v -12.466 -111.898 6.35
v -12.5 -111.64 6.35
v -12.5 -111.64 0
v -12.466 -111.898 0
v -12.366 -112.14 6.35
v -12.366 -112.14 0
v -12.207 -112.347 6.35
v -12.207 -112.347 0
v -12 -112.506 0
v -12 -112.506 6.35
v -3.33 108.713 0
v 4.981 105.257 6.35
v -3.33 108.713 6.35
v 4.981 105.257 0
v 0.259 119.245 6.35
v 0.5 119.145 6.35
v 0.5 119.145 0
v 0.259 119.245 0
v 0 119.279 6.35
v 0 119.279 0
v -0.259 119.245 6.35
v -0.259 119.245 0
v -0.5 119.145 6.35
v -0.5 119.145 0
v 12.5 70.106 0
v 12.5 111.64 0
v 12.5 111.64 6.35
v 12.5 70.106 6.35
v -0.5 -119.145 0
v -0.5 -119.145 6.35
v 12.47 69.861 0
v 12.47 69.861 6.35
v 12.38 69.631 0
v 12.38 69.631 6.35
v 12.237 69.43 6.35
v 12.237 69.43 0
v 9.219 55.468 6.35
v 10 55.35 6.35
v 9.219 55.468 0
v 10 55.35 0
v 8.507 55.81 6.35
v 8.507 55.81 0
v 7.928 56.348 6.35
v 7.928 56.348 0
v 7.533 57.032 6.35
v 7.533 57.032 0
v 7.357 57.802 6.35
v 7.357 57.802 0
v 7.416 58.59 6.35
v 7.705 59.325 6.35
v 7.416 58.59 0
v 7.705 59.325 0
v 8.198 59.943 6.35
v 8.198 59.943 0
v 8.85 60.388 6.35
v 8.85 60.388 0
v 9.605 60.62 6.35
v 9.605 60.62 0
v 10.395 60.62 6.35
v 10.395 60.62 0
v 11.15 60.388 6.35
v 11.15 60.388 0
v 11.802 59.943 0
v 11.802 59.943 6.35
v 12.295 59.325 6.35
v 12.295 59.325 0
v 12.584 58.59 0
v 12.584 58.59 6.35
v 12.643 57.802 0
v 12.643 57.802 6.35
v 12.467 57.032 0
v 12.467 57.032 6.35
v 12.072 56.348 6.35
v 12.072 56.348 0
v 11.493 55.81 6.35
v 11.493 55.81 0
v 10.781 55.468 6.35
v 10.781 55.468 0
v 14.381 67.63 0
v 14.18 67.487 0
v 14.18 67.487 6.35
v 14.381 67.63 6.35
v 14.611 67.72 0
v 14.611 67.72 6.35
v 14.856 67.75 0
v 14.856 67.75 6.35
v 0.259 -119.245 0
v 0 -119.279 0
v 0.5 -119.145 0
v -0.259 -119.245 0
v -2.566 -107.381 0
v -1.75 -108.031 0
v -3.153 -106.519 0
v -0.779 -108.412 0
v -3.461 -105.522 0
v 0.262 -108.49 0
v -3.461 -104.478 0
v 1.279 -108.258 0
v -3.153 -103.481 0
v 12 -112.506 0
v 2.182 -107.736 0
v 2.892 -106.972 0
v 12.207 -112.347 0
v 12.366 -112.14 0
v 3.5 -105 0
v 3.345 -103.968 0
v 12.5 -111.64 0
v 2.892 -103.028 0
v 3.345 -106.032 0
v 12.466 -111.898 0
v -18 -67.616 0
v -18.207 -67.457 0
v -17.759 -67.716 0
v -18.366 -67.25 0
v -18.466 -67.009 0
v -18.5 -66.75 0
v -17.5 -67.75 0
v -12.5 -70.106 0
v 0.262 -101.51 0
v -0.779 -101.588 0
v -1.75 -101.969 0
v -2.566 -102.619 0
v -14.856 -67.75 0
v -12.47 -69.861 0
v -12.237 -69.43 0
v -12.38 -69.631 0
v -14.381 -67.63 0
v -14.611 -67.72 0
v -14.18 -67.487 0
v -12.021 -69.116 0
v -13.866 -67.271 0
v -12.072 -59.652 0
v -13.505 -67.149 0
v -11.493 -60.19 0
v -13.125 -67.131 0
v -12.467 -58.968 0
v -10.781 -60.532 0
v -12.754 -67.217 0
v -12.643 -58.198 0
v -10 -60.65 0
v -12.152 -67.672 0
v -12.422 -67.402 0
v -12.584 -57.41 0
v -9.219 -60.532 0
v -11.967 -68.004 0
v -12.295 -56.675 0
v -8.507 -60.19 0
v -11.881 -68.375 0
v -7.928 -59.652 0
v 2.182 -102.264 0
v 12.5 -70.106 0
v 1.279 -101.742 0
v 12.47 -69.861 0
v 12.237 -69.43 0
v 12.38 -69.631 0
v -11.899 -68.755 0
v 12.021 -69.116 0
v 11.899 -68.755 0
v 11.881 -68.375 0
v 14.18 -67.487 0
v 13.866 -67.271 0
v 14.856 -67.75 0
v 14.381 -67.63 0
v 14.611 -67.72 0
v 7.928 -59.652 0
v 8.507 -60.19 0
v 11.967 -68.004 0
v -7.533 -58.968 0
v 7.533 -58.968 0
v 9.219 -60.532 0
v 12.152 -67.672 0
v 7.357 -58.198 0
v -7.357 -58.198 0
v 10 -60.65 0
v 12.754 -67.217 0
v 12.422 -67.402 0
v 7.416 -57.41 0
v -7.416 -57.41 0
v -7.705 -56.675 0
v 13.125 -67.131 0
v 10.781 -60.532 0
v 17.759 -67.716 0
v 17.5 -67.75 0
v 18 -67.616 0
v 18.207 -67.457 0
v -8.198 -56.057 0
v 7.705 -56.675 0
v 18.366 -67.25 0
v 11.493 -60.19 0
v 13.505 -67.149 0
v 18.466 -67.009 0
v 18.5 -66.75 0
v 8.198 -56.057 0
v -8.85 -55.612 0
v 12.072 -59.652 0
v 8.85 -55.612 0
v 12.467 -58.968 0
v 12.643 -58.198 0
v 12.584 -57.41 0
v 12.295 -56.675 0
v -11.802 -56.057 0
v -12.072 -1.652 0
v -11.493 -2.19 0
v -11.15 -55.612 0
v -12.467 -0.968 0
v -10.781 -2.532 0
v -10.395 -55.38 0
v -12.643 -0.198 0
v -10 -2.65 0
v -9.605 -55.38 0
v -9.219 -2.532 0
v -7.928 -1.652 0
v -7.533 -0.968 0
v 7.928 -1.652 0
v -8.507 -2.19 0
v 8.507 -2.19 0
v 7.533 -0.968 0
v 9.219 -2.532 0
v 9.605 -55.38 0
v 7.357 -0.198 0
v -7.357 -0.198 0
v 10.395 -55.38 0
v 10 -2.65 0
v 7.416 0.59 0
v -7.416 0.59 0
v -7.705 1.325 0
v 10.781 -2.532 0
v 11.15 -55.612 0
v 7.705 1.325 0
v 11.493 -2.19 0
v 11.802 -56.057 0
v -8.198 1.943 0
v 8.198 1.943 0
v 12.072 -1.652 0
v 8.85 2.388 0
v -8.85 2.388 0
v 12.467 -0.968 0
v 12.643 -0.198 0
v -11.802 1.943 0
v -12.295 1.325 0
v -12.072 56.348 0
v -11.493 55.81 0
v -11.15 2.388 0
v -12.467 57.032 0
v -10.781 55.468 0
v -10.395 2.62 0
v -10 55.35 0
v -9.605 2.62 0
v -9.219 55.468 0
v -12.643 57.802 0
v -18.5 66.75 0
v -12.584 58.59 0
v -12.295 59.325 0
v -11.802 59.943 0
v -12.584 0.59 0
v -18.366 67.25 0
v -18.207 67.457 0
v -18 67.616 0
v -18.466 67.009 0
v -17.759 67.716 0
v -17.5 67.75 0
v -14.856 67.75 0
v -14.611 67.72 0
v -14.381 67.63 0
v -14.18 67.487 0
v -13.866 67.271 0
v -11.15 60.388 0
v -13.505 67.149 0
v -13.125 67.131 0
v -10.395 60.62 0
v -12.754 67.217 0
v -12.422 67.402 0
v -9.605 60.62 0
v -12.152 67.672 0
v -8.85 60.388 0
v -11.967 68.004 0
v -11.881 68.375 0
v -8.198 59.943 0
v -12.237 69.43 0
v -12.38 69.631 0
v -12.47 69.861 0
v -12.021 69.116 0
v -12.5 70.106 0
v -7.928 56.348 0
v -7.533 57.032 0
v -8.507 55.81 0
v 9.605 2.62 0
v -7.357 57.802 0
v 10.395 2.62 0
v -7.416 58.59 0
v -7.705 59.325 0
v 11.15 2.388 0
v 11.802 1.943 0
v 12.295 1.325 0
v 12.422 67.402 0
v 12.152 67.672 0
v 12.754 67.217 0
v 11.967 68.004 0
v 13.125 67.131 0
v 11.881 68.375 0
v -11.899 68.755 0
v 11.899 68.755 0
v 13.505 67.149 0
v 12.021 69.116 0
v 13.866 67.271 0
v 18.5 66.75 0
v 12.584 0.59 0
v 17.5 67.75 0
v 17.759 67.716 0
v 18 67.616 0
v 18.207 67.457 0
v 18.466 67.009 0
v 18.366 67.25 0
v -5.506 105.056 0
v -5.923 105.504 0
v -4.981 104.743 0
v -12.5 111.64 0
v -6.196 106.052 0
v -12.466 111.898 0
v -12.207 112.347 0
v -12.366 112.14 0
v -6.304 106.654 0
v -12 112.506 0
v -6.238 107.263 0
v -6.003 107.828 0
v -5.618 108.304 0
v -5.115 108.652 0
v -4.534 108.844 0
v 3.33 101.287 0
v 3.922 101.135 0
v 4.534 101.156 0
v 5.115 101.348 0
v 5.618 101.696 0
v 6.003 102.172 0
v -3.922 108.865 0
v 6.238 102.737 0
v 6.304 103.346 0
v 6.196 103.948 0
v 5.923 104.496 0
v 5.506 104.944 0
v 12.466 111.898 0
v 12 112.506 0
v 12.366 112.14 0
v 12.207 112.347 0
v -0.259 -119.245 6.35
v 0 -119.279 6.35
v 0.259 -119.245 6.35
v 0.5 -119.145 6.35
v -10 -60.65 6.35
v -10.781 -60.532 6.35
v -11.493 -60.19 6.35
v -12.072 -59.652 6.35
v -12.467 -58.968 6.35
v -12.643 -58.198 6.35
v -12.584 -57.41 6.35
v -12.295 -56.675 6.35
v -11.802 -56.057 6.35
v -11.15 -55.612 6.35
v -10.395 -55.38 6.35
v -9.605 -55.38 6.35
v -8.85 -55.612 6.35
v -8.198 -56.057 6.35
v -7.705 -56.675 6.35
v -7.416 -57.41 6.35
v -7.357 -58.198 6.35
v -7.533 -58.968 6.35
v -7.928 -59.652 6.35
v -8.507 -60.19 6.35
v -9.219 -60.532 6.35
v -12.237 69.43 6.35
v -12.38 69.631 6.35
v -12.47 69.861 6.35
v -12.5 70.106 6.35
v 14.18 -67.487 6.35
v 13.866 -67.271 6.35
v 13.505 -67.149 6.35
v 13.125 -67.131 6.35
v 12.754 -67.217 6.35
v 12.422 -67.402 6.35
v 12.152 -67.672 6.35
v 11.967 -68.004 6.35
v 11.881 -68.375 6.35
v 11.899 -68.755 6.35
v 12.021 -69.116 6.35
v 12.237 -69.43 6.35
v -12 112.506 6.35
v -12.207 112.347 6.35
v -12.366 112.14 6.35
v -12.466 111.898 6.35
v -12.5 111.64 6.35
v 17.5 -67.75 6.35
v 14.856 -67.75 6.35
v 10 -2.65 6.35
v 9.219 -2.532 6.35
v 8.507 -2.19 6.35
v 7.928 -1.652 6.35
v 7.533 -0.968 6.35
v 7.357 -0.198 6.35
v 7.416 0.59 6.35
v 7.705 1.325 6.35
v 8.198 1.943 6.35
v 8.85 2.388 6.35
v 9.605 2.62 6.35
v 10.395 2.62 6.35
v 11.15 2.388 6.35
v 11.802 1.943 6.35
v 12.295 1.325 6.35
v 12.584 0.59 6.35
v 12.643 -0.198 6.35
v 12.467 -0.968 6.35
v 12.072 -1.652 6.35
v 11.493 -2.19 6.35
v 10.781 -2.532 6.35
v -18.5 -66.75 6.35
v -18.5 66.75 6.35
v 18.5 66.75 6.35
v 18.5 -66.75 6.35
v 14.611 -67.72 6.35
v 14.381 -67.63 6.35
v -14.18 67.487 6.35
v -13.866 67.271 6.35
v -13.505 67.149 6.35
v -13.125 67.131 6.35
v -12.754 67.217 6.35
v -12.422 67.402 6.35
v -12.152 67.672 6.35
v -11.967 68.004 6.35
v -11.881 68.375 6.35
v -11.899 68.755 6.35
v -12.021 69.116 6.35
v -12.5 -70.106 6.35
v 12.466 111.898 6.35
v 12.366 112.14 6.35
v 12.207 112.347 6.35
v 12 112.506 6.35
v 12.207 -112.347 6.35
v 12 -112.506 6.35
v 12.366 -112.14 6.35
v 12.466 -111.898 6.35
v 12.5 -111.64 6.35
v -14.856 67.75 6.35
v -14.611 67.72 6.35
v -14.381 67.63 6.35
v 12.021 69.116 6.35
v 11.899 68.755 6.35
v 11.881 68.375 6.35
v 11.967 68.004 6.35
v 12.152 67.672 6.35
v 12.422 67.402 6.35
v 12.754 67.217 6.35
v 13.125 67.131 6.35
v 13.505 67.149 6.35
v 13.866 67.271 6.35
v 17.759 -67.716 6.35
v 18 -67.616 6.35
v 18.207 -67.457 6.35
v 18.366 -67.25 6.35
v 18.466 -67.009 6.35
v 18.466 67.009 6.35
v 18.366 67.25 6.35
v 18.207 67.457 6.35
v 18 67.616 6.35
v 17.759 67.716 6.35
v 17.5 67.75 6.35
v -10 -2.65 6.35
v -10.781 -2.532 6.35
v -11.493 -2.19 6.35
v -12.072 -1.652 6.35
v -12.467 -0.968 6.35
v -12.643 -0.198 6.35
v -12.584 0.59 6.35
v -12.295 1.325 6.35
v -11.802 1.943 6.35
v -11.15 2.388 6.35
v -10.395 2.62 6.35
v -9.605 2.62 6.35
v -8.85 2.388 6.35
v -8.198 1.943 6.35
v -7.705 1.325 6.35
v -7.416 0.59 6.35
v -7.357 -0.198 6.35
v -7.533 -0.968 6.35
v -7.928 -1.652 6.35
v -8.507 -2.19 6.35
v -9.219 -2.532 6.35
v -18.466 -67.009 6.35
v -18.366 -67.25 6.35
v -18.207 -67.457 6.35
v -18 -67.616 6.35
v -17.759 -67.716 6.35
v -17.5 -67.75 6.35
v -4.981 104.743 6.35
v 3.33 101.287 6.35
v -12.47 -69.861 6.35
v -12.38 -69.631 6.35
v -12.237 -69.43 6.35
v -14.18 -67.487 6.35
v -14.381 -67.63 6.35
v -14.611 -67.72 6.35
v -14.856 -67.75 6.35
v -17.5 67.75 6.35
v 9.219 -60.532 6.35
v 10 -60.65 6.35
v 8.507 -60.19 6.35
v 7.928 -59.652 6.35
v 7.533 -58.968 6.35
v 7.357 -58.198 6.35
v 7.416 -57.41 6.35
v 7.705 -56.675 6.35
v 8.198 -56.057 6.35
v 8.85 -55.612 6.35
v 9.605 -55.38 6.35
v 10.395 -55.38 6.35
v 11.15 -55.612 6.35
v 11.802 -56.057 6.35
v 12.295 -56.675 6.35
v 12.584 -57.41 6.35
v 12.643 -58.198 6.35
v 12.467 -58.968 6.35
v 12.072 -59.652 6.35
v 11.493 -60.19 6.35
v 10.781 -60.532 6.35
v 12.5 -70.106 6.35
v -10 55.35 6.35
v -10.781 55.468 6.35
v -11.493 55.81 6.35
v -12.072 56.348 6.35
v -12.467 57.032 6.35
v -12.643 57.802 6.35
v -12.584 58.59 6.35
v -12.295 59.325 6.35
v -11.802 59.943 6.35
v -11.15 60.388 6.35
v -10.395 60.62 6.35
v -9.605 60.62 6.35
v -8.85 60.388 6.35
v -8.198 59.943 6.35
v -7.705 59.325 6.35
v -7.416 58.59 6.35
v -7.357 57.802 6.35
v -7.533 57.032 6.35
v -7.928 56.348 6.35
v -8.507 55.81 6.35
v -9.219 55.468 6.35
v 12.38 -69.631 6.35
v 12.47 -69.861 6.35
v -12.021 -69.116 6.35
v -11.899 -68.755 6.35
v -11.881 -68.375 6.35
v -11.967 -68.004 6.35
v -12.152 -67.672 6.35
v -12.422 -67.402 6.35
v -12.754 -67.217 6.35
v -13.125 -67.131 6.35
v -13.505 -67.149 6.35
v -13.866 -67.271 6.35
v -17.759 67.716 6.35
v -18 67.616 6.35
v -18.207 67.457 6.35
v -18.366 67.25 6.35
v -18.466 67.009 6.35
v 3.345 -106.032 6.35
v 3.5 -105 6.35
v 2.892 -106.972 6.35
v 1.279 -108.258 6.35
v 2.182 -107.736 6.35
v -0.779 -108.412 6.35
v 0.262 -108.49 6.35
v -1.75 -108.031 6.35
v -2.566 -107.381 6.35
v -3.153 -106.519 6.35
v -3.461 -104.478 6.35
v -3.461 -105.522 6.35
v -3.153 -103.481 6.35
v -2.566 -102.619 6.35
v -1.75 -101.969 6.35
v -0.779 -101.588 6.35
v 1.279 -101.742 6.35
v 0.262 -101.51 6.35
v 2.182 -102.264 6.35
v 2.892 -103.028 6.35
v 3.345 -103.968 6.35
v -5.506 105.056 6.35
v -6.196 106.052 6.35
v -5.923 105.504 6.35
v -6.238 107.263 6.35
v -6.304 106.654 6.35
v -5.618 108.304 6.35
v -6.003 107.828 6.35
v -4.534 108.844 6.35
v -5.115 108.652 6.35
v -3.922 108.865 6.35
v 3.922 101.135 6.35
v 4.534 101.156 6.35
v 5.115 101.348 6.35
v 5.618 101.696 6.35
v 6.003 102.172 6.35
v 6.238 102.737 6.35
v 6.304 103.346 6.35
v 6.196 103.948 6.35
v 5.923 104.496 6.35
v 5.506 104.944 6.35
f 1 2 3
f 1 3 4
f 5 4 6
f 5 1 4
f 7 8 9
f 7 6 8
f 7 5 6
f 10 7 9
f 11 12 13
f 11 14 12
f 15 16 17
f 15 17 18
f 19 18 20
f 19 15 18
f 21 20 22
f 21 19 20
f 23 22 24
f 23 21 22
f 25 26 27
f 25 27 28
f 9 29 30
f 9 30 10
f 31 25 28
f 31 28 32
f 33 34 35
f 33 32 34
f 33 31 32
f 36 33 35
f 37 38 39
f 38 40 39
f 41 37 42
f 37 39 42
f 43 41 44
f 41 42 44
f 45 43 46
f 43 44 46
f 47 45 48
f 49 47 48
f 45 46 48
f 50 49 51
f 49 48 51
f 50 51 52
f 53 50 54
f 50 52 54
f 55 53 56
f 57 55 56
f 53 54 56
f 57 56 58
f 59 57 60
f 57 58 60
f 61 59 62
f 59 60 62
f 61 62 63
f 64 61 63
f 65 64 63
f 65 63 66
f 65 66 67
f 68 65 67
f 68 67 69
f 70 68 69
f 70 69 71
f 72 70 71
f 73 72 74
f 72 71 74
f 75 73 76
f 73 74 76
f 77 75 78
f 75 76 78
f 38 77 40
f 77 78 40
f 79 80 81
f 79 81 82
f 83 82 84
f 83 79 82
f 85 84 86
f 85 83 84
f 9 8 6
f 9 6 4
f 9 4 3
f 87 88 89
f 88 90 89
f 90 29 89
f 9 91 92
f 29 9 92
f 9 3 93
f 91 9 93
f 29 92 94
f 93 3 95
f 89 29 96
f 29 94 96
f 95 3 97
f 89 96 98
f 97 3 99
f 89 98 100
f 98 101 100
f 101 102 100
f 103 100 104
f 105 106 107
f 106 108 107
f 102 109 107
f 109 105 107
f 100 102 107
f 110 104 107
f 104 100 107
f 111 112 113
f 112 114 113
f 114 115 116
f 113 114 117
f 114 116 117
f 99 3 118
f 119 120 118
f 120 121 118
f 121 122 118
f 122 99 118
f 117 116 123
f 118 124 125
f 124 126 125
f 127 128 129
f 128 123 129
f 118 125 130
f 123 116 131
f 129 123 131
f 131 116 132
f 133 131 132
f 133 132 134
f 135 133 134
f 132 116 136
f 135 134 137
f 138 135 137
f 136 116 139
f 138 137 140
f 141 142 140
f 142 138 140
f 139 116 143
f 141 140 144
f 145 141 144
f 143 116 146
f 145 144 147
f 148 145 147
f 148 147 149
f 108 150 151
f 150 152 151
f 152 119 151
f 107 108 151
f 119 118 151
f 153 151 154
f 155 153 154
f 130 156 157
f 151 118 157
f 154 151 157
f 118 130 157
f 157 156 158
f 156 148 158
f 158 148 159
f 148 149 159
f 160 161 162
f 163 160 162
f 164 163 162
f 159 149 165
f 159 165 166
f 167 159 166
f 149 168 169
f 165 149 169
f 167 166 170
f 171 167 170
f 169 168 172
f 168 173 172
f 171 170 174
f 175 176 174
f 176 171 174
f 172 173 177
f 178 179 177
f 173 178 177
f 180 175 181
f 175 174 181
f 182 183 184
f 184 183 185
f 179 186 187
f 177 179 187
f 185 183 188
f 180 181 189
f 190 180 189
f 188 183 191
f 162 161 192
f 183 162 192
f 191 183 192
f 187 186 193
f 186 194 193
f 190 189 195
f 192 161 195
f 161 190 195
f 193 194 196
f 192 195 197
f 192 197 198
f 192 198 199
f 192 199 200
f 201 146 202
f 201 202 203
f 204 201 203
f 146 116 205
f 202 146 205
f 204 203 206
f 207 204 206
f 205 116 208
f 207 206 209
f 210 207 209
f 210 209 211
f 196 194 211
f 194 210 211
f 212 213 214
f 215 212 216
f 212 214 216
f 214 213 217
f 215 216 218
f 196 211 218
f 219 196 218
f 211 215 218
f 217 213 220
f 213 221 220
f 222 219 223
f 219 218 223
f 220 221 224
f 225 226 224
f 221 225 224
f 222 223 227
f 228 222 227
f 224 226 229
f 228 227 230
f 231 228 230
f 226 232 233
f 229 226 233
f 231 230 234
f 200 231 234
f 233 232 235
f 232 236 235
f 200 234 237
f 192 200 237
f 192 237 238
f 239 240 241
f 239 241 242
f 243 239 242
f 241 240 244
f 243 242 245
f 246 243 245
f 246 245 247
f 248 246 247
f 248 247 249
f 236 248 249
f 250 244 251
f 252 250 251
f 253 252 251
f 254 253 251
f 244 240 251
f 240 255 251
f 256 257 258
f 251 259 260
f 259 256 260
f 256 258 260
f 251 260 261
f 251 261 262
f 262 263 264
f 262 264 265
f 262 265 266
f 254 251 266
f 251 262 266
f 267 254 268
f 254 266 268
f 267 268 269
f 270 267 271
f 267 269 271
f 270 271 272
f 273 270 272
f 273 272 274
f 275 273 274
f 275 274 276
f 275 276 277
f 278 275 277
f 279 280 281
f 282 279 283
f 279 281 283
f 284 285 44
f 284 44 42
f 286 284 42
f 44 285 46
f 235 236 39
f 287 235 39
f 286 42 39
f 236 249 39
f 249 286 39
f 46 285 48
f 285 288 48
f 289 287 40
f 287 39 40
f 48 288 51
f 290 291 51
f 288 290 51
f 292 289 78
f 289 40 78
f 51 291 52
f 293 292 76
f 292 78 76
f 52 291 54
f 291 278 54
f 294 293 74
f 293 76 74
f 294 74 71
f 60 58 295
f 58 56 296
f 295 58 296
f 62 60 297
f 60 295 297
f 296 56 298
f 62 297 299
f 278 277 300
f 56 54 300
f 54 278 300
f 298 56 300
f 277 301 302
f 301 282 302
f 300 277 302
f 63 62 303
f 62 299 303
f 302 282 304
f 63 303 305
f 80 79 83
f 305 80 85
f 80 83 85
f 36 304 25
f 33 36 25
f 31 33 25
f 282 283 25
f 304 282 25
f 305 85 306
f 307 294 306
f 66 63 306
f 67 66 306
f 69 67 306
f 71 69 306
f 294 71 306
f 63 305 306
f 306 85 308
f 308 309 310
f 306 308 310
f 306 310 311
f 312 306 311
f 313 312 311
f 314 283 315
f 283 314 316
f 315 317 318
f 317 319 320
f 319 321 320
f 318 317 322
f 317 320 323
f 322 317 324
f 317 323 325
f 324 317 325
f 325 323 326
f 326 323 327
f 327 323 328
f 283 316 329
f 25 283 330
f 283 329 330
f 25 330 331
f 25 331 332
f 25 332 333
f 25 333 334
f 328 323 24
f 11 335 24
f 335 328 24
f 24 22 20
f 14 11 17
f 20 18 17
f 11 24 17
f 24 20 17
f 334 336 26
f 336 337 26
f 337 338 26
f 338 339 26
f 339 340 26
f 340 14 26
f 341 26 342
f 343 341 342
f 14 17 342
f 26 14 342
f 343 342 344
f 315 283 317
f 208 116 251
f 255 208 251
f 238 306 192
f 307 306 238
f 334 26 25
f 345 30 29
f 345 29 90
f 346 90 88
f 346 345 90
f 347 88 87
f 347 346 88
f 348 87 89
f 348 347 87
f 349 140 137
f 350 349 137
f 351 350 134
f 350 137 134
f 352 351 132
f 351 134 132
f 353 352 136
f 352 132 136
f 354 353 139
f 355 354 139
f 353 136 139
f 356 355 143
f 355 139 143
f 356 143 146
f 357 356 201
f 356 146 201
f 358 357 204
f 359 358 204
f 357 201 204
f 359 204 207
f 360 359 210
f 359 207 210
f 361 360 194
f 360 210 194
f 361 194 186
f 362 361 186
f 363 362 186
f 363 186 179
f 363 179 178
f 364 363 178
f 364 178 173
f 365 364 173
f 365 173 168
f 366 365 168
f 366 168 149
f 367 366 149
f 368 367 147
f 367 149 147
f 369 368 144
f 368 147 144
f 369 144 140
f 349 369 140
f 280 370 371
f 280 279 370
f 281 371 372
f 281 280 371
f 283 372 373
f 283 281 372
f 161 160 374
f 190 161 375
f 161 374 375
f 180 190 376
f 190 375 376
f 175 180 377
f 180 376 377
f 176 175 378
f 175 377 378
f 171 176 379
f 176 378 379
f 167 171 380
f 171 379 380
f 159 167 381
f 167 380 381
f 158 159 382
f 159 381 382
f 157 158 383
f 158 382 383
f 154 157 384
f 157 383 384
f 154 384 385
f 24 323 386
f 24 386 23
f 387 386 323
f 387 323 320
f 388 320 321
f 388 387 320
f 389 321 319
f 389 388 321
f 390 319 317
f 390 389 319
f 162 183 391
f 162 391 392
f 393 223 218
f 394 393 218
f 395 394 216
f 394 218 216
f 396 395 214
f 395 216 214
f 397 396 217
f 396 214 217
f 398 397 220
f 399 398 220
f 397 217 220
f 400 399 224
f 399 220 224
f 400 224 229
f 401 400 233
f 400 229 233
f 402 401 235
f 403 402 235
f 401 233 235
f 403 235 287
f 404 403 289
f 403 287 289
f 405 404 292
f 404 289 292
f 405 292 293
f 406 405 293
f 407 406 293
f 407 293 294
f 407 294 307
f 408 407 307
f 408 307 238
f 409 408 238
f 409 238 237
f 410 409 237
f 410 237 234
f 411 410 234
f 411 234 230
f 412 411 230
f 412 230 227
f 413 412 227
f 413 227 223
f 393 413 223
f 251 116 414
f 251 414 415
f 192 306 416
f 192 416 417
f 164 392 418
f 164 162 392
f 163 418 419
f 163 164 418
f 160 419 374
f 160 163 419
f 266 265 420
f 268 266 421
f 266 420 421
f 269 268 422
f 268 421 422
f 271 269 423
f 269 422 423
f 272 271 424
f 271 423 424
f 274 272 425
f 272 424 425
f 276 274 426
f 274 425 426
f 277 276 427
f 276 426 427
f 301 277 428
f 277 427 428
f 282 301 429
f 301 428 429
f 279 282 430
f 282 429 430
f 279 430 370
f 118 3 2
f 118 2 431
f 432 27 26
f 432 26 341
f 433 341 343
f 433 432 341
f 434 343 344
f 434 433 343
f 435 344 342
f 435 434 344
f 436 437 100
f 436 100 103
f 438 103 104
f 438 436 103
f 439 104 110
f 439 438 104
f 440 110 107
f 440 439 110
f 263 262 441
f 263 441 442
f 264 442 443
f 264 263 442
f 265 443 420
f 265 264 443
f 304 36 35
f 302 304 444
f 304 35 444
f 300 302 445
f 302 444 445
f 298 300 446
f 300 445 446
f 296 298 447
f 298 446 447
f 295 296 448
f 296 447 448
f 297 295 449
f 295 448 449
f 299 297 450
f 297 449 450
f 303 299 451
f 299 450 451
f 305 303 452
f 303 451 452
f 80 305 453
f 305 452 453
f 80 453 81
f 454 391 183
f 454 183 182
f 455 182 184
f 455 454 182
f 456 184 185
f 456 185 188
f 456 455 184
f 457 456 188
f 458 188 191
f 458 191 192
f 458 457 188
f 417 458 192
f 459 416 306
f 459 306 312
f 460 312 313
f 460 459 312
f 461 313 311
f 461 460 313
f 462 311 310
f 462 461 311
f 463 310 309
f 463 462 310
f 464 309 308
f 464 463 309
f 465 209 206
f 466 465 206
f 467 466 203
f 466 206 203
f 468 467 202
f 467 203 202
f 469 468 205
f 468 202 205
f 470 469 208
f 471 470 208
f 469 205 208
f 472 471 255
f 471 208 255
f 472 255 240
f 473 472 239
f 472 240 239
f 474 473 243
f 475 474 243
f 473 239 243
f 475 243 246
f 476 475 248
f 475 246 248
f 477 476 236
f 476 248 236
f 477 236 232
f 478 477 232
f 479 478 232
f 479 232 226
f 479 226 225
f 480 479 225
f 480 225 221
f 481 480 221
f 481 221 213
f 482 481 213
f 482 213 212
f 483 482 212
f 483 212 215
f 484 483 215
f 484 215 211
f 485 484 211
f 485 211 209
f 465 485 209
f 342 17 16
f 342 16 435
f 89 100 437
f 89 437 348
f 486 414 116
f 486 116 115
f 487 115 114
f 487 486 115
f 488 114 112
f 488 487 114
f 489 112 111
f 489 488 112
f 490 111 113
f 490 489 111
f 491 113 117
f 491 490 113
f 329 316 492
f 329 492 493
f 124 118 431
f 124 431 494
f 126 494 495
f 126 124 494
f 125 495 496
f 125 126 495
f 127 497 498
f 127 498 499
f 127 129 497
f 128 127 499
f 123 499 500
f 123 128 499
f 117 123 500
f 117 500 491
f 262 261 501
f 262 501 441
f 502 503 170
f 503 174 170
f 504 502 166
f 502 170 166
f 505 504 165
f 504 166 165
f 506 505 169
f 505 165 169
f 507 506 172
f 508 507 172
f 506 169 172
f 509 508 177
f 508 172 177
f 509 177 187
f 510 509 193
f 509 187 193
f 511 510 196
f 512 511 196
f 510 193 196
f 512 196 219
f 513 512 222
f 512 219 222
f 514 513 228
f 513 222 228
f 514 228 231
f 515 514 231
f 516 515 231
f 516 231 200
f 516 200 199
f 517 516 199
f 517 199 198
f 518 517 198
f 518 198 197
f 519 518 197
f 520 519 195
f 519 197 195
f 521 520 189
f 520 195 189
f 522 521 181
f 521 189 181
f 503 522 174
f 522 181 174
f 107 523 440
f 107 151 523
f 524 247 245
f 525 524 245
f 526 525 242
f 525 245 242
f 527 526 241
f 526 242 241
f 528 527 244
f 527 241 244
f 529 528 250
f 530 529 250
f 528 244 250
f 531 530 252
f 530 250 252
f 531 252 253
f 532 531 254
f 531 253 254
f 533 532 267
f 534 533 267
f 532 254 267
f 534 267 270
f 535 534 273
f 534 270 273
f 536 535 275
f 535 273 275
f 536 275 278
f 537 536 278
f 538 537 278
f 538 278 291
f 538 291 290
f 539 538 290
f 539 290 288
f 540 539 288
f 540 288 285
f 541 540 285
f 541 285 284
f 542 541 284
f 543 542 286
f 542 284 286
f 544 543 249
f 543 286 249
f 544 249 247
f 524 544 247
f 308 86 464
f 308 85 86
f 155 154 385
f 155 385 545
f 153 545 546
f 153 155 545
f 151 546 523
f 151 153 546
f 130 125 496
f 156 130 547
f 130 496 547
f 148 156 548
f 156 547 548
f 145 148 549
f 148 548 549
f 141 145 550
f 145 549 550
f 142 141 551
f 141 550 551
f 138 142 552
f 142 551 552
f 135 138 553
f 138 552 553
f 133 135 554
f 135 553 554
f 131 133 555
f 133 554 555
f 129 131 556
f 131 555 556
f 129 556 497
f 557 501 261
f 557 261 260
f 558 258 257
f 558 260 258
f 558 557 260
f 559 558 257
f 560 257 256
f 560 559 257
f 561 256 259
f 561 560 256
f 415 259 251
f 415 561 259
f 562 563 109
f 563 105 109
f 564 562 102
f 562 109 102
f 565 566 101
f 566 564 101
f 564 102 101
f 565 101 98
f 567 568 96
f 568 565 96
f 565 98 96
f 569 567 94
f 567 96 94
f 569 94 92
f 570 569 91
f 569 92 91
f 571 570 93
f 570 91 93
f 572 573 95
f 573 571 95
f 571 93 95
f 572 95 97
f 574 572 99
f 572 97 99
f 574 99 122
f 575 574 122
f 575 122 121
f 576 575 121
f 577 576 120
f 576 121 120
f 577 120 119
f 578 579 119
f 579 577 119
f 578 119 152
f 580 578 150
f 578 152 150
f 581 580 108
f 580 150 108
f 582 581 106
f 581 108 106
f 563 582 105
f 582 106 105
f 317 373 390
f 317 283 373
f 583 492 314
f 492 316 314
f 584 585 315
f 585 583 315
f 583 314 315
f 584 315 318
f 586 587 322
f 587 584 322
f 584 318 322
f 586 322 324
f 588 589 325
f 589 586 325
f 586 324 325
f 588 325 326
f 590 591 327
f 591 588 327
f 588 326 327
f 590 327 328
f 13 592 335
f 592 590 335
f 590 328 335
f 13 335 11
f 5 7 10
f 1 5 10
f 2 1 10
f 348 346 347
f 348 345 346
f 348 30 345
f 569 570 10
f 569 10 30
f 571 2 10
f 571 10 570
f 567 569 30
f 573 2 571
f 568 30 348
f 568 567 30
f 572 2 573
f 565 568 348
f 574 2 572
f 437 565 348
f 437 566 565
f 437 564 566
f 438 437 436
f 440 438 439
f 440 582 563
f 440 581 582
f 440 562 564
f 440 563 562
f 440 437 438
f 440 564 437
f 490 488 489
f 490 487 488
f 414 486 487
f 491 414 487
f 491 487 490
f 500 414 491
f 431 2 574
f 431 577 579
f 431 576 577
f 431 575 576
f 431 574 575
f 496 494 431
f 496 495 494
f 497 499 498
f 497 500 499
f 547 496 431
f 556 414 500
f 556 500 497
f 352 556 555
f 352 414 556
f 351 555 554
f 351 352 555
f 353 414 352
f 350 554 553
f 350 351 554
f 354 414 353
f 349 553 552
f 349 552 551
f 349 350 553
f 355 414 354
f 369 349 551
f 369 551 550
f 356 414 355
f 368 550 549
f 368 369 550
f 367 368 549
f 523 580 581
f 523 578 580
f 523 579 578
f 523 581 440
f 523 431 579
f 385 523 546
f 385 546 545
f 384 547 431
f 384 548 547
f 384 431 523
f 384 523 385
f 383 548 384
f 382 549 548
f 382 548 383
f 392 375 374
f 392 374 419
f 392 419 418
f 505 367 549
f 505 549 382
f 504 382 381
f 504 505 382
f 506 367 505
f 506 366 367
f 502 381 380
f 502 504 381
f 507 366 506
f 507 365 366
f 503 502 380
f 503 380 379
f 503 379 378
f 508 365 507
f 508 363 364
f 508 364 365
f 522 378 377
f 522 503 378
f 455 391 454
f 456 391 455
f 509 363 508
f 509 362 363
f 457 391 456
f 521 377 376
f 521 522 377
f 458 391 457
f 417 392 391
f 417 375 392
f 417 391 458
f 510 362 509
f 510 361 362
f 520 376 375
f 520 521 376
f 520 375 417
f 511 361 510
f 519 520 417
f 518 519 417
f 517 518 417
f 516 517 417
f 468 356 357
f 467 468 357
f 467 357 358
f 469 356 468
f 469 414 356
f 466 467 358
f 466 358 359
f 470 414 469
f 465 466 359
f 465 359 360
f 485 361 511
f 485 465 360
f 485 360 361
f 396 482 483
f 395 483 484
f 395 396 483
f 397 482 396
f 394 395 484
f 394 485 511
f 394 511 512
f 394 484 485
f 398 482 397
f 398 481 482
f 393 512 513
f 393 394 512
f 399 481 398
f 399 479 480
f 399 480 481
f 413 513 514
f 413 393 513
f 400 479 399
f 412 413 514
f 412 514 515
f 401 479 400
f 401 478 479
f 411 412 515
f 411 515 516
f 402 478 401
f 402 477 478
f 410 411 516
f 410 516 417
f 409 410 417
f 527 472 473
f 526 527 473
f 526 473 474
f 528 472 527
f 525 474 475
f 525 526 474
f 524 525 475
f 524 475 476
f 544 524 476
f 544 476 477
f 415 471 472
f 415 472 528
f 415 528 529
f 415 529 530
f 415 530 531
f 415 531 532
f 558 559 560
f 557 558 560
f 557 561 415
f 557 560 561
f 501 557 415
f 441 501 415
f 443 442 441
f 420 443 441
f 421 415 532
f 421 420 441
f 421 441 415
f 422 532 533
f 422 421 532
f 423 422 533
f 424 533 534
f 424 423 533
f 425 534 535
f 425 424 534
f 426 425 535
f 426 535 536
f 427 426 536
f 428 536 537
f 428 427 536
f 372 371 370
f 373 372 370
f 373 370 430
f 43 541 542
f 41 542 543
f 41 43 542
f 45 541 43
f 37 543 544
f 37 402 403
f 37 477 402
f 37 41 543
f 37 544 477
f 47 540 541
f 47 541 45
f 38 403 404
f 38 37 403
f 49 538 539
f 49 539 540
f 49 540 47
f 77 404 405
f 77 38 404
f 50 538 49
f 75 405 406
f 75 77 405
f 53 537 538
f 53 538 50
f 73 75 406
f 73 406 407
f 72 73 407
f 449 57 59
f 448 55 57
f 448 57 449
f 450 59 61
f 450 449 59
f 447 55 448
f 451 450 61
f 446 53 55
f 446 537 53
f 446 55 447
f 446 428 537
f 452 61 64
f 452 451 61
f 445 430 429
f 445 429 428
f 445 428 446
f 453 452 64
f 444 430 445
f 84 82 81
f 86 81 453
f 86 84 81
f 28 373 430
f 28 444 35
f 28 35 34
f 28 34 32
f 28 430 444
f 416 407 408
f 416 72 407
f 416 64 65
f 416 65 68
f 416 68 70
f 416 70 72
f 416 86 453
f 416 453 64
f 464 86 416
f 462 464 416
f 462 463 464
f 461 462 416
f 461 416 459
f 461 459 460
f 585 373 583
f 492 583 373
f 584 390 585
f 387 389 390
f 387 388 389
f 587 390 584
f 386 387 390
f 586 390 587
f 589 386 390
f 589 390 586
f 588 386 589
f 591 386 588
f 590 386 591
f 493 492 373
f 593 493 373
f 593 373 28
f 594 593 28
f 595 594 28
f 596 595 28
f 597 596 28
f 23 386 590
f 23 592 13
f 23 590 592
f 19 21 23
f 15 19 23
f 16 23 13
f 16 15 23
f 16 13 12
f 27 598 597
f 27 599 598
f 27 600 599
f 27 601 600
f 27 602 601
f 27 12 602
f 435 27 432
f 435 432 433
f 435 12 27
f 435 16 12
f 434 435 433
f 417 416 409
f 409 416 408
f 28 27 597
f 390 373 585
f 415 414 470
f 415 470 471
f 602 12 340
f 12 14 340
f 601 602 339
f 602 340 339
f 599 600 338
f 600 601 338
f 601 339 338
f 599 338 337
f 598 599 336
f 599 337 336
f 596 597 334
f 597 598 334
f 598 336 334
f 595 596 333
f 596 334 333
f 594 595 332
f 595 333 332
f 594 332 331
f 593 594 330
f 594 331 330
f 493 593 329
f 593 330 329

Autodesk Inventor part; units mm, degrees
ref_plane "YZ Plane" through (0, 0, 0) normal (1, 0, 0) x (0, 1, 0)
ref_plane "XZ Plane" through (0, 0, 0) normal (0, 1, 0) x (-1, 0, 0)
ref_plane "XY Plane" through (0, 0, 0) normal (0, 0, 1) x (1, 0, 0)
sketch "Sketch1" plane through (0, 0, 0) normal (0, 0, 1) x (1, 0, 0)
  line L0 (12.5, -112.2169) -> (-12.5, -112.2169)
  line L1 (-12.5, -112.2169) -> (-12.5, 112.2169)
  line L2 (-12.5, 112.2169) -> (12.5, 112.2169)
  line L3 (12.5, 112.2169) -> (12.5, -112.2169)
  line L4 (12.5, -112.2169) -> (-12.5, 112.2169) construction
  line L5 (-12.5, -112.2169) -> (12.5, 112.2169) construction
  line L6 (0, 105) -> (0, -105) construction
  line L7 (-12.5, 112.2169) -> (0, 119.4338)
  line L8 (0, 119.4338) -> (12.5, 112.2169)
  line L9 (12.5, 112.2169) -> (12.5, 97.7831)
  line L10 (12.5, 97.7831) -> (0, 90.5662)
  line L11 (0, 90.5662) -> (-12.5, 97.7831)
  line L12 (-12.5, 97.7831) -> (-12.5, 112.2169)
  line L13 (-12.5, -112.2169) -> (-12.5, -97.7831)
  line L14 (-12.5, -97.7831) -> (0, -90.5662)
  line L15 (0, -90.5662) -> (12.5, -97.7831)
  line L16 (12.5, -97.7831) -> (12.5, -112.2169)
  line L17 (12.5, -112.2169) -> (0, -119.4338)
  line L18 (0, -119.4338) -> (-12.5, -112.2169)
  line L19 (-4.1551, 106.7278) -> (4.1551, 103.2722) construction
  line L20 (-4.9806, 104.7427) -> (3.3295, 101.287)
  line L21 (4.9806, 105.2573) -> (-3.3295, 108.713)
  arc A0 (-3.3295, 108.713) -> (-4.9806, 104.7427) centre (-4.1551, 106.7278) ccw
  arc A1 (3.3295, 101.287) -> (4.9806, 105.2573) centre (4.1551, 103.2722) ccw
  circle A2 centre (0, -105) radius 3.5
  line L22 (18.5, -67.75) -> (-18.5, -67.75)
  line L23 (-18.5, -67.75) -> (-18.5, 67.75)
  line L24 (-18.5, 67.75) -> (18.5, 67.75)
  line L25 (18.5, 67.75) -> (18.5, -67.75)
  line L26 (18.5, -67.75) -> (-18.5, 67.75) construction
  line L27 (-18.5, -67.75) -> (18.5, 67.75) construction
  circle A3 centre (0, 0) radius 12.7
  point P0 (252.5, 0)
  point P1 (-12.5, -67.75)
  point P2 (12.5, -112.2169)
  point P3 (-12.5, 67.75)
  point P4 (12.5, 67.75)
  point P5 (12.5, -67.75)
  point P6 (12.5, 97.7831)
  point P7 (-12.5, 112.2169)
  point P8 (12.5, -97.7831)
  point P9 (-12.5, -112.2169)
  point P10 (12.5, -112.2169)
  point P11 (12.5, -2.245)
  point P12 (-12.5, -2.245)
  point P13 (-12.5, 2.245)
  point P14 (12.5, 2.245)
  dimension "d0" = 25
  dimension "d1" = 252.5
  dimension "d2" = 210
  dimension "d3" = 4.3
  dimension "d4" = 9
  dimension "d5" = 7
  dimension "d12" = 135.5
  dimension "d13" = 37
  dimension "d43" = 25.4
extrude "Extrusion1" add sketch "Sketch1" along normal blind 6.35
sketch "Sketch2" plane through (0, 0, 6.35) normal (0, 0, 1) x (1, 0, 0)
  line L0 (-18.5, 67.75) -> (-18.5, -67.75) projected
  line L1 (-18.5, -67.75) -> (-12.5, -67.75) projected
  line L2 (-12.5, -67.75) -> (-12.5, -112.2169) projected
  line L3 (-12.5, -112.2169) -> (0, -119.4338) projected
  line L4 (0, -119.4338) -> (12.5, -112.2169) projected
  line L5 (12.5, -112.2169) -> (12.5, -67.75) projected
  line L6 (12.5, -67.75) -> (18.5, -67.75) projected
  line L7 (18.5, -67.75) -> (18.5, 67.75) projected
  line L8 (18.5, 67.75) -> (12.5, 67.75) projected
  line L9 (12.5, 67.75) -> (12.5, 112.2169) projected
  line L10 (12.5, 112.2169) -> (0, 119.4338) projected
  line L11 (0, 119.4338) -> (-12.5, 112.2169) projected
  line L12 (-12.5, 112.2169) -> (-12.5, 67.75) projected
  line L13 (-12.5, 67.75) -> (-18.5, 67.75) projected
  arc A0 (-3.3295, 108.713) -> (-4.9806, 104.7427) centre (-4.1551, 106.7278) ccw projected
  line L14 (-3.3295, 108.713) -> (4.9806, 105.2573) projected
  arc A1 (3.3295, 101.287) -> (4.9806, 105.2573) centre (4.1551, 103.2722) ccw projected
  line L15 (3.3295, 101.287) -> (-4.9806, 104.7427) projected
  circle A2 centre (0, -105) radius 3.5 projected
  circle A3 centre (-13.25, 68.5) radius 1.375
  point P0 (0, 0)
  point P1 (-12.5, 69.6524)
  point P2 (-14.4024, 67.75)
  dimension "d16" = 0.75
  dimension "d17" = 2.75
  dimension "d18" = 0.75
extrude "Extrusion2" cut sketch "Sketch2" against normal through all contours L13 L12 A3 picked at (-12.4132, 68.945)
mirror "Mirror1" about plane through (0, 0, 0) normal (1, 0, 0) of "Extrusion2"
mirror "Mirror2" about plane through (0, 0, 0) normal (0, 1, 0) of "Extrusion2", "Mirror1"
sketch "Sketch4" plane through (0, 0, 6.35) normal (0, 0, 1) x (1, 0, 0)
  line L0 (-18.5, -67.75) -> (-14.4024, -67.75) construction
  line L1 (10, -58) -> (-10, -58) construction
  line L2 (-10, -58) -> (-10, 58) construction
  line L3 (-10, 58) -> (10, 58) construction
  line L4 (10, 58) -> (10, -58) construction
  line L5 (10, -58) -> (-10, 58) construction
  line L6 (-10, -58) -> (10, 58) construction
  point P0 (0, 0)
  point P1 (10, 0)
  point P2 (-10, 0)
  dimension "d45" = 20
  dimension "d46" = 116
hole "Hole2" at (10, -58, 6.35) at (-10, -58, 6.35) at (-10, 0, 6.35) at (10, 0, 6.35) at (10, 58, 6.35) at (-10, 58, 6.35) direction (0, 0, -1) diameter 5.3 end through all
fillet "Fillet3" radius 1 18 edges at (-18.5, 67.75, 3.175) (-18.5, -67.75, 3.175) (14.4024, -67.75, 3.175) (-14.4024, -67.75, 3.175) (-12.5, -69.6524, 3.175) (18.5, -67.75, 3.175) (12.5, -69.6524, 3.175) (0, -119.4338, 3.175) (12.5, -112.2169, 3.175) (-12.5, -112.2169, 3.175) (18.5, 67.75, 3.175) (-14.4024, 67.75, 3.175) (14.4024, 67.75, 3.175) (0, 119.4338, 3.175) (-12.5, 112.2169, 3.175) (-12.5, 69.6524, 3.175) (12.5, 69.6524, 3.175) (12.5, 112.2169, 3.175)
equation "\"d18\" = d16"
properties part number "Z-Axis Nut and Bed Plate RevIII" material "Aluminum 6061"
